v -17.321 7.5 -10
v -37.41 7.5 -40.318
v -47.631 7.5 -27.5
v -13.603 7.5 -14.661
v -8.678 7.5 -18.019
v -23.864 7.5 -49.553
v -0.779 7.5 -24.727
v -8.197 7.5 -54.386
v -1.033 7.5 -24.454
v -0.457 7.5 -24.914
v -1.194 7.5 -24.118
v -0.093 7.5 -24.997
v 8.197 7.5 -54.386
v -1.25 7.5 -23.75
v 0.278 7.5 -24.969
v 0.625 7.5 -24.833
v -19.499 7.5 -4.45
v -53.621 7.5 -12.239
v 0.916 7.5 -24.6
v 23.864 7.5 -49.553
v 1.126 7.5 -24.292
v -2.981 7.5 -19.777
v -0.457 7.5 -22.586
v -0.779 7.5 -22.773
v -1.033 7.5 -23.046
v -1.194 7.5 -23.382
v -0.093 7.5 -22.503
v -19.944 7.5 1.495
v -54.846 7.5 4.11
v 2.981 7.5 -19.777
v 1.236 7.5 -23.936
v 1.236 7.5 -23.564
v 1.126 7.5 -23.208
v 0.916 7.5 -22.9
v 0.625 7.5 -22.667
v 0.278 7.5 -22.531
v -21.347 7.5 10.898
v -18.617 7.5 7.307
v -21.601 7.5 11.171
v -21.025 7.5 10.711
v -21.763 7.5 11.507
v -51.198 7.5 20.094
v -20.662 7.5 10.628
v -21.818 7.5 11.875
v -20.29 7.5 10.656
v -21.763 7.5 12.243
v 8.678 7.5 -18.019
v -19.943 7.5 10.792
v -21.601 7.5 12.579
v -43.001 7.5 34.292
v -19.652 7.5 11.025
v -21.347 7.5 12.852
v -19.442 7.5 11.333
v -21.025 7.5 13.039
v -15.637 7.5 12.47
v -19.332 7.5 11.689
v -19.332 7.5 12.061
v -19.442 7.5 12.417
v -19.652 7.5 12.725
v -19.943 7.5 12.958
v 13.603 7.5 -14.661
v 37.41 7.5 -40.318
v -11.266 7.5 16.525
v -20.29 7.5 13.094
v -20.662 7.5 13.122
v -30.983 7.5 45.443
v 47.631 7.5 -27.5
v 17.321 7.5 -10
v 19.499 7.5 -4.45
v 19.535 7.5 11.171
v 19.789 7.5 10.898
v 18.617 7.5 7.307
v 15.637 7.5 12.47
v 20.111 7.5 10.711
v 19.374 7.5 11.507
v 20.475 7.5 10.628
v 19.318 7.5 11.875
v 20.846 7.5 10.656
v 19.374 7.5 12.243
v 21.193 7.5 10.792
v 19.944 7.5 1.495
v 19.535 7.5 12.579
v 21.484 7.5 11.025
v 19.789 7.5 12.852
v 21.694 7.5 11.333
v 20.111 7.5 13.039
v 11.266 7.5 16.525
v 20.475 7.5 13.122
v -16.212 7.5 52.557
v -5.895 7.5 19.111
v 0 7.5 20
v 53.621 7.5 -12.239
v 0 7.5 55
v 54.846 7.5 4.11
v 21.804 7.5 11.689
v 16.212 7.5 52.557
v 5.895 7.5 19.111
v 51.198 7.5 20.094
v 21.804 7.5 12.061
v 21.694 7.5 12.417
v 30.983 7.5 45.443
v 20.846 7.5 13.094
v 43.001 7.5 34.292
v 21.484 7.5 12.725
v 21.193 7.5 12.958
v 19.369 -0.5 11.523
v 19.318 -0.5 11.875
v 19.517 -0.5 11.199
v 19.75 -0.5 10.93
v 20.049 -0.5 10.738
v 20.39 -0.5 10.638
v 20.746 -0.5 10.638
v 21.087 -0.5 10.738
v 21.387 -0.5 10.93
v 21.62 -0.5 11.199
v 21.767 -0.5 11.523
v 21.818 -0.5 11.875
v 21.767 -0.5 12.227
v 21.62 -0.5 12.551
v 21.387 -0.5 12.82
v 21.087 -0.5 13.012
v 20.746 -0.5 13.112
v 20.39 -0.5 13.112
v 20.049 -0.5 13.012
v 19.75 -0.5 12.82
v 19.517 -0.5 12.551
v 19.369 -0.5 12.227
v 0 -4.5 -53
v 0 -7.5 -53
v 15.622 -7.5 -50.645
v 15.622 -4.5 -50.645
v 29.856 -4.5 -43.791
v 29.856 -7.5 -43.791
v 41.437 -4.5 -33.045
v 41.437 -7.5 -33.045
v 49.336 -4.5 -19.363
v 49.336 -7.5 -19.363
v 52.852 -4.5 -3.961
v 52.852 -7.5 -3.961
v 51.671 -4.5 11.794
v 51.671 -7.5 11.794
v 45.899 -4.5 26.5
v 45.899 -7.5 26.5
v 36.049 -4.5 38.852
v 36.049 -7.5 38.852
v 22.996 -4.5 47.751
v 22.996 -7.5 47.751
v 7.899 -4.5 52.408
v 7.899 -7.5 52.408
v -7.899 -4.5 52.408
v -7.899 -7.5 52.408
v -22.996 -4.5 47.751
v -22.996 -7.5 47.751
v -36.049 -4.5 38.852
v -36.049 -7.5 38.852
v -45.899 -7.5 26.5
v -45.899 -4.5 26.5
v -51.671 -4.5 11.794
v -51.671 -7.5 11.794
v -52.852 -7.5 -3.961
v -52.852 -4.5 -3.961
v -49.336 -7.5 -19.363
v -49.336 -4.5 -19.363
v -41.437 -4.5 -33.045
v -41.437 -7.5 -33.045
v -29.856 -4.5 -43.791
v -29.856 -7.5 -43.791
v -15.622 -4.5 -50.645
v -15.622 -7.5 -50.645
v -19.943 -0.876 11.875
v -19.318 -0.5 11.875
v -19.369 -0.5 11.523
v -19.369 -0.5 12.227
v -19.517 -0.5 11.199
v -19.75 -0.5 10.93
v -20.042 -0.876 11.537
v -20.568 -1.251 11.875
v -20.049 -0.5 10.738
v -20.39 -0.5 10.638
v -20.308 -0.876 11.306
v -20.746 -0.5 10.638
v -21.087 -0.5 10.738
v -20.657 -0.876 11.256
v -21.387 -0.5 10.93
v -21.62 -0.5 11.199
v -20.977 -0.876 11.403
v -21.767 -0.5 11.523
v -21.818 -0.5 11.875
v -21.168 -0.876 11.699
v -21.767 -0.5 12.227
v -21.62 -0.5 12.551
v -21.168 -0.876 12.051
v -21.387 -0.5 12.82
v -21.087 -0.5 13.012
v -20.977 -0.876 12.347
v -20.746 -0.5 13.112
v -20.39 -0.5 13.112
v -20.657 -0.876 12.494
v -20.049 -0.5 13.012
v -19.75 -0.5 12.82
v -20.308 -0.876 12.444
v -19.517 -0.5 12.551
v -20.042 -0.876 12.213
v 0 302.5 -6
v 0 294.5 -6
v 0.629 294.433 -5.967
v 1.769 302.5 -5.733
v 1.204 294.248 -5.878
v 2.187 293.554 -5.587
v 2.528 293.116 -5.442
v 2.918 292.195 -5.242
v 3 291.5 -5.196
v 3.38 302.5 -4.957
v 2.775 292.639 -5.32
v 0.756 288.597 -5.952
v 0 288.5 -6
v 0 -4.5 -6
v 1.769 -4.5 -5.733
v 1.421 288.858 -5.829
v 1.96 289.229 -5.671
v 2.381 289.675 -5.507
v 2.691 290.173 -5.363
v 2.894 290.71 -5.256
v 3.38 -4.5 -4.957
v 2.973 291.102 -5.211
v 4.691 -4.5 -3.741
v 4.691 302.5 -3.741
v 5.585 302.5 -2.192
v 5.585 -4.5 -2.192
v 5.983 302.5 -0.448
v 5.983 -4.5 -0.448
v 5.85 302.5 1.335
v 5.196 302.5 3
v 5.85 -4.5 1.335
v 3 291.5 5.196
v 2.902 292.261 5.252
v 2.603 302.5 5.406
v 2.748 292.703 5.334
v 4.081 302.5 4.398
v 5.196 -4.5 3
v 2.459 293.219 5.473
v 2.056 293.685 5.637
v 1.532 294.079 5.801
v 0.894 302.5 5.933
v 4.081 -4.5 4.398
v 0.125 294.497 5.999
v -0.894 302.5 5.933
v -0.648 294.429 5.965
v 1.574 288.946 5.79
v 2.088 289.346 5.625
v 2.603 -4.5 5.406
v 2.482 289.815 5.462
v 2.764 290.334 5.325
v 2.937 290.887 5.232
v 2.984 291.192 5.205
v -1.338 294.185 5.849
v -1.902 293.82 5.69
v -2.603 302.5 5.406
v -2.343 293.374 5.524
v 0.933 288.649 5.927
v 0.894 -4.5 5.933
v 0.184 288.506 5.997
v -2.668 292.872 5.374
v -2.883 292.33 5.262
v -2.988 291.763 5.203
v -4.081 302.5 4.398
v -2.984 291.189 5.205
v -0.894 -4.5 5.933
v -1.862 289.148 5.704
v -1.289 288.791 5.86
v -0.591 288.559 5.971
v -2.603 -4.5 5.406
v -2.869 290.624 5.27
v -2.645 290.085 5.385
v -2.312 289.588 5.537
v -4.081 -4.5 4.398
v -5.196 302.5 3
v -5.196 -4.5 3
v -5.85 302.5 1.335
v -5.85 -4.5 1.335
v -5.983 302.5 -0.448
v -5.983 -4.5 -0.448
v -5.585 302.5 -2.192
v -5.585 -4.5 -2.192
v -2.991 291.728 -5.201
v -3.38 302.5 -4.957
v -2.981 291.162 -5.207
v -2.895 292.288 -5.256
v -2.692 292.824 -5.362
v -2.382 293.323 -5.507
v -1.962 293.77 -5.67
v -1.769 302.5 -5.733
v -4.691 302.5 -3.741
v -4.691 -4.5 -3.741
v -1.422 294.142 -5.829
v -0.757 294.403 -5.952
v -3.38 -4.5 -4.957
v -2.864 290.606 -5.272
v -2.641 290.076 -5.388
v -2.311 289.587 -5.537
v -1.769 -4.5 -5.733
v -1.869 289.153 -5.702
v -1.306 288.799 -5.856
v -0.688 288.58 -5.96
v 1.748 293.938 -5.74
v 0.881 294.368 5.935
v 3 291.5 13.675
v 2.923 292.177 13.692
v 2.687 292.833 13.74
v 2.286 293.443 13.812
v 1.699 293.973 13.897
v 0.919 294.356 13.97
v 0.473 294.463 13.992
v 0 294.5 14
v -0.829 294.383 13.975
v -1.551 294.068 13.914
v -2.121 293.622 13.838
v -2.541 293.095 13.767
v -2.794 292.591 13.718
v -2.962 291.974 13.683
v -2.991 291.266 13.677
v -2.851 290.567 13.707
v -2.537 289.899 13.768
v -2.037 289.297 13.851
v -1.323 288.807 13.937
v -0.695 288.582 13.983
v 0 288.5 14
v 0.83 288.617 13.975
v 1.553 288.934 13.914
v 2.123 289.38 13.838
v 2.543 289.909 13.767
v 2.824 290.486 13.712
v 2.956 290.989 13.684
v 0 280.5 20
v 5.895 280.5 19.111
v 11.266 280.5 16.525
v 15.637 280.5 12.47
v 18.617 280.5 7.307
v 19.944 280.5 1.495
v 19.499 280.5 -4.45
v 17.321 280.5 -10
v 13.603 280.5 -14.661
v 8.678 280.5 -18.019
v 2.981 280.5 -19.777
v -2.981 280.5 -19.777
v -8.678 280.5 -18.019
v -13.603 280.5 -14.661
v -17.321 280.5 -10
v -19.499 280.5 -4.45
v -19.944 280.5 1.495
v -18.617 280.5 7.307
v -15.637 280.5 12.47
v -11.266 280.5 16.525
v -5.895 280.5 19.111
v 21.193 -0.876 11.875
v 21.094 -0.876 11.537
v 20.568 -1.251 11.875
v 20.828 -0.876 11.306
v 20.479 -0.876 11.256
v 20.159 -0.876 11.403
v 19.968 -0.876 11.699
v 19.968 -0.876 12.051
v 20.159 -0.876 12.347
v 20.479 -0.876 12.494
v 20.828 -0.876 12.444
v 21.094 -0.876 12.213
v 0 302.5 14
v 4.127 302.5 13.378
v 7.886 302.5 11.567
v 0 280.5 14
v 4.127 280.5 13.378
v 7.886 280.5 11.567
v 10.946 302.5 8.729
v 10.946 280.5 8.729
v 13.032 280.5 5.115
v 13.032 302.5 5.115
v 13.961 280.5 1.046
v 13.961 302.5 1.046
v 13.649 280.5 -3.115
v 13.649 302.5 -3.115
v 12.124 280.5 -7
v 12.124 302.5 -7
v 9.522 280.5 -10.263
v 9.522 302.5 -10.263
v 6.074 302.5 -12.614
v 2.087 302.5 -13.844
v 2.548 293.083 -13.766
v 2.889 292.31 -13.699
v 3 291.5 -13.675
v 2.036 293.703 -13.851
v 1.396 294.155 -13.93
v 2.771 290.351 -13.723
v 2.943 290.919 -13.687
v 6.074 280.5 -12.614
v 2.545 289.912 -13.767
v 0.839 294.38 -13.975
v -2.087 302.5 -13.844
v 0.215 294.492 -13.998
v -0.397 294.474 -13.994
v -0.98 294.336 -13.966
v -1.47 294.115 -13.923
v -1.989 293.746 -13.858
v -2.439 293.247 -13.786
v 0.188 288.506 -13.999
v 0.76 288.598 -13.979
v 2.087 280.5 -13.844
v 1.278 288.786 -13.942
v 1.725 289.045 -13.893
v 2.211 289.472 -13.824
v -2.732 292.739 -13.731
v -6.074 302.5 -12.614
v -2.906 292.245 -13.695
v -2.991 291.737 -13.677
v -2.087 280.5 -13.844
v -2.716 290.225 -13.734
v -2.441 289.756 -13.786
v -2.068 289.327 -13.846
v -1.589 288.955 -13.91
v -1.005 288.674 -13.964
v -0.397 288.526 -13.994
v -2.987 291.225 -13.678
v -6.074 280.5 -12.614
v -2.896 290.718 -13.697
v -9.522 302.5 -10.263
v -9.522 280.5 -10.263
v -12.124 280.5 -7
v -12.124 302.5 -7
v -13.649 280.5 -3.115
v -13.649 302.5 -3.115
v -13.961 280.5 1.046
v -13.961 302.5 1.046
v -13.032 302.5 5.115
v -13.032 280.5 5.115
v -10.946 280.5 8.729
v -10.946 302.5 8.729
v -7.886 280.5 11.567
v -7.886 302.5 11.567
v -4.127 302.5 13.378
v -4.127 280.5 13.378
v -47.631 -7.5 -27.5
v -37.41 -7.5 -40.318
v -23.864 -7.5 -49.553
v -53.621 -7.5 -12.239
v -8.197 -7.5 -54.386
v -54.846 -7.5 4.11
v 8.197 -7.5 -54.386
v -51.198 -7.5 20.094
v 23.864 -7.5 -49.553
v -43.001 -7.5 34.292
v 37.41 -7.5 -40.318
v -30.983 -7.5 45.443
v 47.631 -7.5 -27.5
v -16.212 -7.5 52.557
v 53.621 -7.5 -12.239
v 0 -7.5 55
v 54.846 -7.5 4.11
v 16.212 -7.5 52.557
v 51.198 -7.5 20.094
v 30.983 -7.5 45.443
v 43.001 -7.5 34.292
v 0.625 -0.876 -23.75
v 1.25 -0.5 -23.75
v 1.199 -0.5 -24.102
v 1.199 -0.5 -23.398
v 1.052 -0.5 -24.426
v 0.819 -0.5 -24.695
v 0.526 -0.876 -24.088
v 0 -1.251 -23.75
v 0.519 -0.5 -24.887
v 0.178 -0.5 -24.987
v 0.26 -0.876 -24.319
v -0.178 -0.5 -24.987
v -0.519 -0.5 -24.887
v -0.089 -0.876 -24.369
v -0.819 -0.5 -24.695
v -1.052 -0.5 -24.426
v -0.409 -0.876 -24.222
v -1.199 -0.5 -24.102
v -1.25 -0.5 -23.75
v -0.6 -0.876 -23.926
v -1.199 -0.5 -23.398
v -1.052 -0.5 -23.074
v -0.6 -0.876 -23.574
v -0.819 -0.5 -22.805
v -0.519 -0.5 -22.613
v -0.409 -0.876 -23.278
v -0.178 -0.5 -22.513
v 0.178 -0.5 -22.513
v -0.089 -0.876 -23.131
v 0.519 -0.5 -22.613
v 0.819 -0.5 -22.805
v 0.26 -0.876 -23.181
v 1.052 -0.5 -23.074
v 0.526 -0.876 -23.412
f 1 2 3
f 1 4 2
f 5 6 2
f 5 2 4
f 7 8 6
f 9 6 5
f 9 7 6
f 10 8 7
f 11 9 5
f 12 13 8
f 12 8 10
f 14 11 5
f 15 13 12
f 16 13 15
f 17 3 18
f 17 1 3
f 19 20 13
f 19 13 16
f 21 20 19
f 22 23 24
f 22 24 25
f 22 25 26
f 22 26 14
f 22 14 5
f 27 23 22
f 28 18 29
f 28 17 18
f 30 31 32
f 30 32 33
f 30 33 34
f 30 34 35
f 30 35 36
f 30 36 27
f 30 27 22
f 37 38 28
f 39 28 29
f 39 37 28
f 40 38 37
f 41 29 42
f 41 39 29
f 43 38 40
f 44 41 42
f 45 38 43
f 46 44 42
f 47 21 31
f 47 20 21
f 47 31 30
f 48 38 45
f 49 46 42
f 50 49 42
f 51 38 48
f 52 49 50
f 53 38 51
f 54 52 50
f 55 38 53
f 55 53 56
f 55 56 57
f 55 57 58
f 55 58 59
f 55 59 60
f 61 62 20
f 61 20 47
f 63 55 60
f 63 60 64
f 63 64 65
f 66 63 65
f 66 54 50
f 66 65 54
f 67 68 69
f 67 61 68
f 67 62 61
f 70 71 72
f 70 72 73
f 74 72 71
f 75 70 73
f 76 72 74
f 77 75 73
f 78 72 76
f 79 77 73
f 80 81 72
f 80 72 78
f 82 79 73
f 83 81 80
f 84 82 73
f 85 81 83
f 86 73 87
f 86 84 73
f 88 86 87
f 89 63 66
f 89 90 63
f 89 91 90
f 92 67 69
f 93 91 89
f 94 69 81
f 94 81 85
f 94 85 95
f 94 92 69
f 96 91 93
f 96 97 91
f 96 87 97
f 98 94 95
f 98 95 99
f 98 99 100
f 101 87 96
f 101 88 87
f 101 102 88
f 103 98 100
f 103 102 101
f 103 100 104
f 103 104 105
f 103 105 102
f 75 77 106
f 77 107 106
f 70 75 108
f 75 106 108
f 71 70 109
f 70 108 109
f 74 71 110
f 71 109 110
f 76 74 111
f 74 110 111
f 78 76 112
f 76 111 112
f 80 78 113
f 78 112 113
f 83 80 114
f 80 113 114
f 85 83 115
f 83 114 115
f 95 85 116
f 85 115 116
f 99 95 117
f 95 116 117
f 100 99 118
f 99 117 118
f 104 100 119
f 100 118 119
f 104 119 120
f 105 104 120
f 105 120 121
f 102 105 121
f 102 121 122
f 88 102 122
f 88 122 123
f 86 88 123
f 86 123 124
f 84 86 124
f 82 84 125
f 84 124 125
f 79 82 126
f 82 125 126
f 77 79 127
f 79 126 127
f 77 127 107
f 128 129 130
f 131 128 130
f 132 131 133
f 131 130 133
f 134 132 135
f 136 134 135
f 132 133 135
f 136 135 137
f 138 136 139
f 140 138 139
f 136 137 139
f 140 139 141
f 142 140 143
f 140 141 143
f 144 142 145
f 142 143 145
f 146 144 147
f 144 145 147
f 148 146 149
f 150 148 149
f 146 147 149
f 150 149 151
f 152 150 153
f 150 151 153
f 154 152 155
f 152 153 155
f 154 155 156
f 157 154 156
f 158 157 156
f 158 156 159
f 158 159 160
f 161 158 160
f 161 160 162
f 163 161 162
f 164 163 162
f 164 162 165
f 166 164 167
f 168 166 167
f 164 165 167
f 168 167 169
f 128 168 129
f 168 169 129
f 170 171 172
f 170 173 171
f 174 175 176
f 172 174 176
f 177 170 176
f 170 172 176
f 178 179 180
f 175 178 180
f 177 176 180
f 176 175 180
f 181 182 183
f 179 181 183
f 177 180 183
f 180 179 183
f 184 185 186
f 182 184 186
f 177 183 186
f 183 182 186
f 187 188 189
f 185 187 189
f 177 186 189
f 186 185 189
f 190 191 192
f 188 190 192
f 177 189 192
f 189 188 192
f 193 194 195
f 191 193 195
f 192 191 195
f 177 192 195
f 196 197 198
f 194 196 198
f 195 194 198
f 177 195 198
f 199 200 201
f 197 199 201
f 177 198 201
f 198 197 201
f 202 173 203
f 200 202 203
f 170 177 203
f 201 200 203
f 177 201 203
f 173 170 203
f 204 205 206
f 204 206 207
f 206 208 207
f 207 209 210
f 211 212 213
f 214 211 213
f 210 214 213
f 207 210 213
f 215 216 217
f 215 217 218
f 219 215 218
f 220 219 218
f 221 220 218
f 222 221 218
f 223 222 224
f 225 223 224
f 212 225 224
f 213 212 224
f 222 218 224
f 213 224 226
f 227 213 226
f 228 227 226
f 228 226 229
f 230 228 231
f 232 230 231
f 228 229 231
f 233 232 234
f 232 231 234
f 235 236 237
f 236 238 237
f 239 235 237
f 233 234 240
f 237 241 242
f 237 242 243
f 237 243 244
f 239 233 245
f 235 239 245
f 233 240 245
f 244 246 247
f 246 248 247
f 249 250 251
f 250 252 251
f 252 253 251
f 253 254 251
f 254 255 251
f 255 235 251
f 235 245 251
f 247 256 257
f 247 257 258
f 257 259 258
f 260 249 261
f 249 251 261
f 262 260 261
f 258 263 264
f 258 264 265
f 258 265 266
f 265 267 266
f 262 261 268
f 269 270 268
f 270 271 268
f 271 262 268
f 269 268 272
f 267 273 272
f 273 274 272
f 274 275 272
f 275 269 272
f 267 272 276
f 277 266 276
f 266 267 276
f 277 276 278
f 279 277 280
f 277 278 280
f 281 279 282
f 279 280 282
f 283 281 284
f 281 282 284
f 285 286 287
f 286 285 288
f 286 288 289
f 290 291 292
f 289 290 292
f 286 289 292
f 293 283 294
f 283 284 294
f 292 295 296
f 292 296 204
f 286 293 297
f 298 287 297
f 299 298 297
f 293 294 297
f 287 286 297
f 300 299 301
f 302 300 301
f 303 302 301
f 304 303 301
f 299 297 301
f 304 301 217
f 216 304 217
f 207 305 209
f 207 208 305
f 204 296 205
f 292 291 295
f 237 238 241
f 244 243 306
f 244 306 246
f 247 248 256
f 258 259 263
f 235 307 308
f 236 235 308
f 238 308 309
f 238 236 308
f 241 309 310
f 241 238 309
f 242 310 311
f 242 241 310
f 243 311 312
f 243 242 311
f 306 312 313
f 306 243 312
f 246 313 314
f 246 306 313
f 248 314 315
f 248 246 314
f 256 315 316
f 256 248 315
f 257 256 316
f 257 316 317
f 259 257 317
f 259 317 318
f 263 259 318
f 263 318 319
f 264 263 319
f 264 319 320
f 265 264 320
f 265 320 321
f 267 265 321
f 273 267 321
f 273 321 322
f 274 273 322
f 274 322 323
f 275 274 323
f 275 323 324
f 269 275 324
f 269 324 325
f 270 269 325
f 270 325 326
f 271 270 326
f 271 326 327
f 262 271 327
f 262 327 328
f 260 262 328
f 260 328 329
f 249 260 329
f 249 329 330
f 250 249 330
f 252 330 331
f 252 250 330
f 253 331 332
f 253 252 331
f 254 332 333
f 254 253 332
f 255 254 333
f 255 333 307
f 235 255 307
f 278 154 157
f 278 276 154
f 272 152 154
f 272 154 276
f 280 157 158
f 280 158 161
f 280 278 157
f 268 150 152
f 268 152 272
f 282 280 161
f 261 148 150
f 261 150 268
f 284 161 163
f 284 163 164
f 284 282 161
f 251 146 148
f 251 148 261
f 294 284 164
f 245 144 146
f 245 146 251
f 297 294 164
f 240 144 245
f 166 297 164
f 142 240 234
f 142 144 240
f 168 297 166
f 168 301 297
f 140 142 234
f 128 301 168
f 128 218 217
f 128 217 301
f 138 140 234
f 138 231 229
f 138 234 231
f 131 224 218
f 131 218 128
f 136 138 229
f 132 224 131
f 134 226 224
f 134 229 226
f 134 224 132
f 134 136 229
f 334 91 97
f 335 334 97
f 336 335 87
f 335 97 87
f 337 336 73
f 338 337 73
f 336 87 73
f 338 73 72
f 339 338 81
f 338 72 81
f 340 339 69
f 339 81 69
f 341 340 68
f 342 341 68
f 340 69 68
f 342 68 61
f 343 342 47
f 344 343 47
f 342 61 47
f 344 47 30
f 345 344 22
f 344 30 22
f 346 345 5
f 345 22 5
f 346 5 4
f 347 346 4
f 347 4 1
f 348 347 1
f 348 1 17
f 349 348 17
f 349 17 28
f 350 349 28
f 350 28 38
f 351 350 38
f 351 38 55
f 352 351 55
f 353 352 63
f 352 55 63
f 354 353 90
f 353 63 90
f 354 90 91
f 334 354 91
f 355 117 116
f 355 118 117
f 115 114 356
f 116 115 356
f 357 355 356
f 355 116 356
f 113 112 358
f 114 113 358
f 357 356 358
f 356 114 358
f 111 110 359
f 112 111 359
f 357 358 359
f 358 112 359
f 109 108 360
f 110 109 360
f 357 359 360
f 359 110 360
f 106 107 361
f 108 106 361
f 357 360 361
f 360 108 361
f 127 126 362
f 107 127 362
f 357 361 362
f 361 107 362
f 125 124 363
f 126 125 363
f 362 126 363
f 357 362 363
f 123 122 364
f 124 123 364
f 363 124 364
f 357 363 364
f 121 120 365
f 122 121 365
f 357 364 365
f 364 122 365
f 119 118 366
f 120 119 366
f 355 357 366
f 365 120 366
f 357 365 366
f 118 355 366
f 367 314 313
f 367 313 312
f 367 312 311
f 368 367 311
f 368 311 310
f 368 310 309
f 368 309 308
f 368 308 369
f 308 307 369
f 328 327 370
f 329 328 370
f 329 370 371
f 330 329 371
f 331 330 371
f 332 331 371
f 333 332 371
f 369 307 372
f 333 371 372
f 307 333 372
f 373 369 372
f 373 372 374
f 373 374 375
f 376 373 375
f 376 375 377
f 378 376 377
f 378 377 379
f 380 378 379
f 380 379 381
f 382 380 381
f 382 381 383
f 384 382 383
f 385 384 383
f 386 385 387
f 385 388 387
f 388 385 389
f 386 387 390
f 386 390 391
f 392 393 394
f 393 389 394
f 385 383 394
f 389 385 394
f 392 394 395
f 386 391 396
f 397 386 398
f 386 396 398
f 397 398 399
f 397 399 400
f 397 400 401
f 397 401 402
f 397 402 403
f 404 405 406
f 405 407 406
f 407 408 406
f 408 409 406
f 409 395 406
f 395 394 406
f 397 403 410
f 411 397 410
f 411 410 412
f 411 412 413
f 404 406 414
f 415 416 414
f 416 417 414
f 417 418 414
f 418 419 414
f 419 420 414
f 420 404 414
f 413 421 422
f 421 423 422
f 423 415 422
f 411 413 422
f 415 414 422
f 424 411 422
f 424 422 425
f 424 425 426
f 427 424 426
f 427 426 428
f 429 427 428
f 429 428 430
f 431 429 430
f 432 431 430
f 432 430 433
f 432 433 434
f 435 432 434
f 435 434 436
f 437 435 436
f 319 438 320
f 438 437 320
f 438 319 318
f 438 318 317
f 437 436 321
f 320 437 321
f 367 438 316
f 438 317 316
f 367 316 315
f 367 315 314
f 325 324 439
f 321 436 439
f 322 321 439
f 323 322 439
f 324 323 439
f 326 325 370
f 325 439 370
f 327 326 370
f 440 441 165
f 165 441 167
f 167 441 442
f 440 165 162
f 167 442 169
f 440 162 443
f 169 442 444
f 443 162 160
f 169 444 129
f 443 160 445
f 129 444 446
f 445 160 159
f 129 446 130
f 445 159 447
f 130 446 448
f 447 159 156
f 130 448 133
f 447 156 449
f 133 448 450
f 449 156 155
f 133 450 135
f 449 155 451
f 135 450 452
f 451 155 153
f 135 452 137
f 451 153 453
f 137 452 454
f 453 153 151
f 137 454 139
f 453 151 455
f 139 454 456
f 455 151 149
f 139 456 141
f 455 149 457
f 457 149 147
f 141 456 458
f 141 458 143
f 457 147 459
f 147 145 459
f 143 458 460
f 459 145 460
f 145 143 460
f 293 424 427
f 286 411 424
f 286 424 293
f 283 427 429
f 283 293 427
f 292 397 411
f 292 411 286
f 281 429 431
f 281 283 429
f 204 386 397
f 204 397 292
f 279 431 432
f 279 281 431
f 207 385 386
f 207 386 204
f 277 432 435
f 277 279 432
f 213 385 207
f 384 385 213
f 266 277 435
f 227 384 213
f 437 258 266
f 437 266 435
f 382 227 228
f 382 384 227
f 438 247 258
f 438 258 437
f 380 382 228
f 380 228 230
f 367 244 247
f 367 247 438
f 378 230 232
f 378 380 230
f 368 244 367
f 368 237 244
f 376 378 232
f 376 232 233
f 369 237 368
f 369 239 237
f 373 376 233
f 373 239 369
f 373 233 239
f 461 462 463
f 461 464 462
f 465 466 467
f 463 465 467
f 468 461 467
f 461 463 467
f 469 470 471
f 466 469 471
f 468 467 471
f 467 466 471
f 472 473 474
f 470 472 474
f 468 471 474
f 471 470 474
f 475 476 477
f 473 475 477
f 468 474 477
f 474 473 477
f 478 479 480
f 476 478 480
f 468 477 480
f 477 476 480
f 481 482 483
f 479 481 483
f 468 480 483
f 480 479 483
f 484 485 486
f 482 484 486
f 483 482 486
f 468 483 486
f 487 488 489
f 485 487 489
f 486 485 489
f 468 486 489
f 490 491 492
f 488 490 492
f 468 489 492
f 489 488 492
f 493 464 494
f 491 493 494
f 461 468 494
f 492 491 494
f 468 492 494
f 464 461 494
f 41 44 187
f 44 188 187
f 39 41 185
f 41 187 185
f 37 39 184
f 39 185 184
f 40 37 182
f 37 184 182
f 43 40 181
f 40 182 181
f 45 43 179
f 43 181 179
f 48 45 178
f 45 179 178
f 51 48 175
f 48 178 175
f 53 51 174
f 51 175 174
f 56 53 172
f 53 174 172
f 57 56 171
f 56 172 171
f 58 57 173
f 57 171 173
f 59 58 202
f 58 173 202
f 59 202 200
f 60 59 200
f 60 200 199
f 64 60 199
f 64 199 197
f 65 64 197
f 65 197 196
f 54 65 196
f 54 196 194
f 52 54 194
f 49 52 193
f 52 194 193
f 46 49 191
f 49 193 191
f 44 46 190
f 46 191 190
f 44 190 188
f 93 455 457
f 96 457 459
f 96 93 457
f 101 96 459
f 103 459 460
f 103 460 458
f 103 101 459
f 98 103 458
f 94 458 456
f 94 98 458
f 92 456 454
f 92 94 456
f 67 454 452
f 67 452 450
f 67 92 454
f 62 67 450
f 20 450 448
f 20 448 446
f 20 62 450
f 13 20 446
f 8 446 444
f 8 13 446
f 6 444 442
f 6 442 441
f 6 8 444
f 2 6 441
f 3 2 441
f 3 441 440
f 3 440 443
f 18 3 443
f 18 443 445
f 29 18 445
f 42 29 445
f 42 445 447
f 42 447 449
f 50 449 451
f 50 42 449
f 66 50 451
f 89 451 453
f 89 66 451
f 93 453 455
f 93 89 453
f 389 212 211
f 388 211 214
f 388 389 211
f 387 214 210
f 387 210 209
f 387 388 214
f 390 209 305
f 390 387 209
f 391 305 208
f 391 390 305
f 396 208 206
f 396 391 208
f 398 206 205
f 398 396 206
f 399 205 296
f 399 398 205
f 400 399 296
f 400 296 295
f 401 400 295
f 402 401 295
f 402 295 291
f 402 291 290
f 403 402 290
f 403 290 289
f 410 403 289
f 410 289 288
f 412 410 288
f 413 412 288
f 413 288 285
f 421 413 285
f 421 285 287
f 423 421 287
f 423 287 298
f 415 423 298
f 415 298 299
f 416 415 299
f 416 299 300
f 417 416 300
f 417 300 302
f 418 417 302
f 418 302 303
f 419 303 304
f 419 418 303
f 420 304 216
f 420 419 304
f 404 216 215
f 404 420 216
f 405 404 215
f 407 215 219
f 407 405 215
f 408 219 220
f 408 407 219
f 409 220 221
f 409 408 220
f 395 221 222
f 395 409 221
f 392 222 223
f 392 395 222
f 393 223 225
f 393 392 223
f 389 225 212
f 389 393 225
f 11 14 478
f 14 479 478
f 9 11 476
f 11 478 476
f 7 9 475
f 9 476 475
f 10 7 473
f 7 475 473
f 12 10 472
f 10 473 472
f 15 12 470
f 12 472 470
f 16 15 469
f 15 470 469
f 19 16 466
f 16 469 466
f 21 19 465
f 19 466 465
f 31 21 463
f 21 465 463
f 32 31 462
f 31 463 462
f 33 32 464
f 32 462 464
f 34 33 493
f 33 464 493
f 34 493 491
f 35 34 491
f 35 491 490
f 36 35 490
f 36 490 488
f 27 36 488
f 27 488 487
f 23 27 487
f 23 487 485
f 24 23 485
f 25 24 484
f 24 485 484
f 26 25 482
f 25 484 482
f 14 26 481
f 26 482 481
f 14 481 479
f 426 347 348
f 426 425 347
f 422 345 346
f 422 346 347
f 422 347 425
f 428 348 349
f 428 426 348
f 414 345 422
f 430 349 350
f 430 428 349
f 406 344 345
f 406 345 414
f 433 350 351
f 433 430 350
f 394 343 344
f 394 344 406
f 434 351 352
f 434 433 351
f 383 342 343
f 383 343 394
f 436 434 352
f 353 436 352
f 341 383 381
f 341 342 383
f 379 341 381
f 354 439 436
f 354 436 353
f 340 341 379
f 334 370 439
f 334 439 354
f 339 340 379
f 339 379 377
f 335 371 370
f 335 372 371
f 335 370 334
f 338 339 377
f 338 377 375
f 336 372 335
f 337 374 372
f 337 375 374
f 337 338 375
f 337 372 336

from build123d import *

# Parameters (mm, degrees)
SKETCH1_R               = 55
BOSS_EXTRUDE1_DEPTH     = 7.5
SKETCH2_R               = 20
BOSS_EXTRUDE2_DEPTH     = 273
SKETCH3_R               = 14
BOSS_EXTRUDE3_DEPTH     = 22
SKETCH4_R               = 53
CUT_EXTRUDE1_DEPTH      = 3
SKETCH5_R               = 6
CUT_EXTRUDE2_DEPTH      = 317.700173666
CUT_EXTRUDE3_DEPTH      = 313.339959019
CUT_EXTRUDE3_DEPTH_BACK = 313.339959019
SKETCH7_R               = 3
M3_TAPPED_HOLE1_D       = 2.5
M3_TAPPED_HOLE1_DEPTH   = 8
M3_TAPPED_HOLE1_TIP     = 0.751075774


with BuildPart() as part:
    # Sketch1 → Boss-Extrude1 (new, symmetric)
    with BuildSketch(Plane(origin=(0, 0, 0), x_dir=(1, 0, 0), z_dir=(0, 1, 0))):
        with Locations(Location((0, 0, 0), (0, 0, 270))):
            Circle(SKETCH1_R)
    extrude(amount=BOSS_EXTRUDE1_DEPTH, both=True)

    # Sketch2 → Boss-Extrude2 (add)
    with BuildSketch(Plane(origin=(0, 7.5, 0), x_dir=(1, 0, 0), z_dir=(0, 1, 0))):
        with Locations(Location((0, 0, 0), (0, 0, 270))):
            Circle(SKETCH2_R)
    extrude(amount=BOSS_EXTRUDE2_DEPTH)

    # Sketch3 → Boss-Extrude3 (add)
    with BuildSketch(Plane(origin=(0, 280.5, 0), x_dir=(1, 0, 0), z_dir=(0, 1, 0))):
        with Locations(Location((0, 0, 0), (0, 0, 270))):
            Circle(SKETCH3_R)
    extrude(amount=BOSS_EXTRUDE3_DEPTH)

    # Sketch4 → Cut-Extrude1 (cut)
    with BuildSketch(Plane.XZ.offset(7.5)):
        with Locations(Location((0, 0, 0), (0, 0, 270))):
            Circle(SKETCH4_R)
    extrude(amount=-CUT_EXTRUDE1_DEPTH, mode=Mode.SUBTRACT)

    # Sketch5 → Cut-Extrude2 (cut, through all)
    with BuildSketch(Plane.XZ.offset(4.5)):
        with Locations(Location((0, 0, 0), (0, 0, 270))):
            Circle(SKETCH5_R)
    extrude(amount=-CUT_EXTRUDE2_DEPTH, mode=Mode.SUBTRACT)

    # Sketch7 → Cut-Extrude3 (cut, two sides: drawn at the far end of the back side and taken through both)
    with BuildSketch(Plane.XY.offset(-CUT_EXTRUDE3_DEPTH_BACK)):
        with Locations((0, 291.5)):
            Circle(SKETCH7_R)
    extrude(amount=CUT_EXTRUDE3_DEPTH + CUT_EXTRUDE3_DEPTH_BACK, mode=Mode.SUBTRACT)

    # M3 Tapped Hole1
    with Locations(Plane(origin=(0, 7.5, 0), x_dir=(1, 0, 0), z_dir=(0, 1, 0))):
        with Locations((-20.56810334, -11.875), (20.56810334, -11.875), (0, 23.75)):
            Hole(M3_TAPPED_HOLE1_D / 2, depth=M3_TAPPED_HOLE1_DEPTH)
            with Locations((0, 0, -(M3_TAPPED_HOLE1_DEPTH + M3_TAPPED_HOLE1_TIP / 2))):  # 118° drill point
                Cone(0, M3_TAPPED_HOLE1_D / 2, M3_TAPPED_HOLE1_TIP, mode=Mode.SUBTRACT)


solid = part.part
